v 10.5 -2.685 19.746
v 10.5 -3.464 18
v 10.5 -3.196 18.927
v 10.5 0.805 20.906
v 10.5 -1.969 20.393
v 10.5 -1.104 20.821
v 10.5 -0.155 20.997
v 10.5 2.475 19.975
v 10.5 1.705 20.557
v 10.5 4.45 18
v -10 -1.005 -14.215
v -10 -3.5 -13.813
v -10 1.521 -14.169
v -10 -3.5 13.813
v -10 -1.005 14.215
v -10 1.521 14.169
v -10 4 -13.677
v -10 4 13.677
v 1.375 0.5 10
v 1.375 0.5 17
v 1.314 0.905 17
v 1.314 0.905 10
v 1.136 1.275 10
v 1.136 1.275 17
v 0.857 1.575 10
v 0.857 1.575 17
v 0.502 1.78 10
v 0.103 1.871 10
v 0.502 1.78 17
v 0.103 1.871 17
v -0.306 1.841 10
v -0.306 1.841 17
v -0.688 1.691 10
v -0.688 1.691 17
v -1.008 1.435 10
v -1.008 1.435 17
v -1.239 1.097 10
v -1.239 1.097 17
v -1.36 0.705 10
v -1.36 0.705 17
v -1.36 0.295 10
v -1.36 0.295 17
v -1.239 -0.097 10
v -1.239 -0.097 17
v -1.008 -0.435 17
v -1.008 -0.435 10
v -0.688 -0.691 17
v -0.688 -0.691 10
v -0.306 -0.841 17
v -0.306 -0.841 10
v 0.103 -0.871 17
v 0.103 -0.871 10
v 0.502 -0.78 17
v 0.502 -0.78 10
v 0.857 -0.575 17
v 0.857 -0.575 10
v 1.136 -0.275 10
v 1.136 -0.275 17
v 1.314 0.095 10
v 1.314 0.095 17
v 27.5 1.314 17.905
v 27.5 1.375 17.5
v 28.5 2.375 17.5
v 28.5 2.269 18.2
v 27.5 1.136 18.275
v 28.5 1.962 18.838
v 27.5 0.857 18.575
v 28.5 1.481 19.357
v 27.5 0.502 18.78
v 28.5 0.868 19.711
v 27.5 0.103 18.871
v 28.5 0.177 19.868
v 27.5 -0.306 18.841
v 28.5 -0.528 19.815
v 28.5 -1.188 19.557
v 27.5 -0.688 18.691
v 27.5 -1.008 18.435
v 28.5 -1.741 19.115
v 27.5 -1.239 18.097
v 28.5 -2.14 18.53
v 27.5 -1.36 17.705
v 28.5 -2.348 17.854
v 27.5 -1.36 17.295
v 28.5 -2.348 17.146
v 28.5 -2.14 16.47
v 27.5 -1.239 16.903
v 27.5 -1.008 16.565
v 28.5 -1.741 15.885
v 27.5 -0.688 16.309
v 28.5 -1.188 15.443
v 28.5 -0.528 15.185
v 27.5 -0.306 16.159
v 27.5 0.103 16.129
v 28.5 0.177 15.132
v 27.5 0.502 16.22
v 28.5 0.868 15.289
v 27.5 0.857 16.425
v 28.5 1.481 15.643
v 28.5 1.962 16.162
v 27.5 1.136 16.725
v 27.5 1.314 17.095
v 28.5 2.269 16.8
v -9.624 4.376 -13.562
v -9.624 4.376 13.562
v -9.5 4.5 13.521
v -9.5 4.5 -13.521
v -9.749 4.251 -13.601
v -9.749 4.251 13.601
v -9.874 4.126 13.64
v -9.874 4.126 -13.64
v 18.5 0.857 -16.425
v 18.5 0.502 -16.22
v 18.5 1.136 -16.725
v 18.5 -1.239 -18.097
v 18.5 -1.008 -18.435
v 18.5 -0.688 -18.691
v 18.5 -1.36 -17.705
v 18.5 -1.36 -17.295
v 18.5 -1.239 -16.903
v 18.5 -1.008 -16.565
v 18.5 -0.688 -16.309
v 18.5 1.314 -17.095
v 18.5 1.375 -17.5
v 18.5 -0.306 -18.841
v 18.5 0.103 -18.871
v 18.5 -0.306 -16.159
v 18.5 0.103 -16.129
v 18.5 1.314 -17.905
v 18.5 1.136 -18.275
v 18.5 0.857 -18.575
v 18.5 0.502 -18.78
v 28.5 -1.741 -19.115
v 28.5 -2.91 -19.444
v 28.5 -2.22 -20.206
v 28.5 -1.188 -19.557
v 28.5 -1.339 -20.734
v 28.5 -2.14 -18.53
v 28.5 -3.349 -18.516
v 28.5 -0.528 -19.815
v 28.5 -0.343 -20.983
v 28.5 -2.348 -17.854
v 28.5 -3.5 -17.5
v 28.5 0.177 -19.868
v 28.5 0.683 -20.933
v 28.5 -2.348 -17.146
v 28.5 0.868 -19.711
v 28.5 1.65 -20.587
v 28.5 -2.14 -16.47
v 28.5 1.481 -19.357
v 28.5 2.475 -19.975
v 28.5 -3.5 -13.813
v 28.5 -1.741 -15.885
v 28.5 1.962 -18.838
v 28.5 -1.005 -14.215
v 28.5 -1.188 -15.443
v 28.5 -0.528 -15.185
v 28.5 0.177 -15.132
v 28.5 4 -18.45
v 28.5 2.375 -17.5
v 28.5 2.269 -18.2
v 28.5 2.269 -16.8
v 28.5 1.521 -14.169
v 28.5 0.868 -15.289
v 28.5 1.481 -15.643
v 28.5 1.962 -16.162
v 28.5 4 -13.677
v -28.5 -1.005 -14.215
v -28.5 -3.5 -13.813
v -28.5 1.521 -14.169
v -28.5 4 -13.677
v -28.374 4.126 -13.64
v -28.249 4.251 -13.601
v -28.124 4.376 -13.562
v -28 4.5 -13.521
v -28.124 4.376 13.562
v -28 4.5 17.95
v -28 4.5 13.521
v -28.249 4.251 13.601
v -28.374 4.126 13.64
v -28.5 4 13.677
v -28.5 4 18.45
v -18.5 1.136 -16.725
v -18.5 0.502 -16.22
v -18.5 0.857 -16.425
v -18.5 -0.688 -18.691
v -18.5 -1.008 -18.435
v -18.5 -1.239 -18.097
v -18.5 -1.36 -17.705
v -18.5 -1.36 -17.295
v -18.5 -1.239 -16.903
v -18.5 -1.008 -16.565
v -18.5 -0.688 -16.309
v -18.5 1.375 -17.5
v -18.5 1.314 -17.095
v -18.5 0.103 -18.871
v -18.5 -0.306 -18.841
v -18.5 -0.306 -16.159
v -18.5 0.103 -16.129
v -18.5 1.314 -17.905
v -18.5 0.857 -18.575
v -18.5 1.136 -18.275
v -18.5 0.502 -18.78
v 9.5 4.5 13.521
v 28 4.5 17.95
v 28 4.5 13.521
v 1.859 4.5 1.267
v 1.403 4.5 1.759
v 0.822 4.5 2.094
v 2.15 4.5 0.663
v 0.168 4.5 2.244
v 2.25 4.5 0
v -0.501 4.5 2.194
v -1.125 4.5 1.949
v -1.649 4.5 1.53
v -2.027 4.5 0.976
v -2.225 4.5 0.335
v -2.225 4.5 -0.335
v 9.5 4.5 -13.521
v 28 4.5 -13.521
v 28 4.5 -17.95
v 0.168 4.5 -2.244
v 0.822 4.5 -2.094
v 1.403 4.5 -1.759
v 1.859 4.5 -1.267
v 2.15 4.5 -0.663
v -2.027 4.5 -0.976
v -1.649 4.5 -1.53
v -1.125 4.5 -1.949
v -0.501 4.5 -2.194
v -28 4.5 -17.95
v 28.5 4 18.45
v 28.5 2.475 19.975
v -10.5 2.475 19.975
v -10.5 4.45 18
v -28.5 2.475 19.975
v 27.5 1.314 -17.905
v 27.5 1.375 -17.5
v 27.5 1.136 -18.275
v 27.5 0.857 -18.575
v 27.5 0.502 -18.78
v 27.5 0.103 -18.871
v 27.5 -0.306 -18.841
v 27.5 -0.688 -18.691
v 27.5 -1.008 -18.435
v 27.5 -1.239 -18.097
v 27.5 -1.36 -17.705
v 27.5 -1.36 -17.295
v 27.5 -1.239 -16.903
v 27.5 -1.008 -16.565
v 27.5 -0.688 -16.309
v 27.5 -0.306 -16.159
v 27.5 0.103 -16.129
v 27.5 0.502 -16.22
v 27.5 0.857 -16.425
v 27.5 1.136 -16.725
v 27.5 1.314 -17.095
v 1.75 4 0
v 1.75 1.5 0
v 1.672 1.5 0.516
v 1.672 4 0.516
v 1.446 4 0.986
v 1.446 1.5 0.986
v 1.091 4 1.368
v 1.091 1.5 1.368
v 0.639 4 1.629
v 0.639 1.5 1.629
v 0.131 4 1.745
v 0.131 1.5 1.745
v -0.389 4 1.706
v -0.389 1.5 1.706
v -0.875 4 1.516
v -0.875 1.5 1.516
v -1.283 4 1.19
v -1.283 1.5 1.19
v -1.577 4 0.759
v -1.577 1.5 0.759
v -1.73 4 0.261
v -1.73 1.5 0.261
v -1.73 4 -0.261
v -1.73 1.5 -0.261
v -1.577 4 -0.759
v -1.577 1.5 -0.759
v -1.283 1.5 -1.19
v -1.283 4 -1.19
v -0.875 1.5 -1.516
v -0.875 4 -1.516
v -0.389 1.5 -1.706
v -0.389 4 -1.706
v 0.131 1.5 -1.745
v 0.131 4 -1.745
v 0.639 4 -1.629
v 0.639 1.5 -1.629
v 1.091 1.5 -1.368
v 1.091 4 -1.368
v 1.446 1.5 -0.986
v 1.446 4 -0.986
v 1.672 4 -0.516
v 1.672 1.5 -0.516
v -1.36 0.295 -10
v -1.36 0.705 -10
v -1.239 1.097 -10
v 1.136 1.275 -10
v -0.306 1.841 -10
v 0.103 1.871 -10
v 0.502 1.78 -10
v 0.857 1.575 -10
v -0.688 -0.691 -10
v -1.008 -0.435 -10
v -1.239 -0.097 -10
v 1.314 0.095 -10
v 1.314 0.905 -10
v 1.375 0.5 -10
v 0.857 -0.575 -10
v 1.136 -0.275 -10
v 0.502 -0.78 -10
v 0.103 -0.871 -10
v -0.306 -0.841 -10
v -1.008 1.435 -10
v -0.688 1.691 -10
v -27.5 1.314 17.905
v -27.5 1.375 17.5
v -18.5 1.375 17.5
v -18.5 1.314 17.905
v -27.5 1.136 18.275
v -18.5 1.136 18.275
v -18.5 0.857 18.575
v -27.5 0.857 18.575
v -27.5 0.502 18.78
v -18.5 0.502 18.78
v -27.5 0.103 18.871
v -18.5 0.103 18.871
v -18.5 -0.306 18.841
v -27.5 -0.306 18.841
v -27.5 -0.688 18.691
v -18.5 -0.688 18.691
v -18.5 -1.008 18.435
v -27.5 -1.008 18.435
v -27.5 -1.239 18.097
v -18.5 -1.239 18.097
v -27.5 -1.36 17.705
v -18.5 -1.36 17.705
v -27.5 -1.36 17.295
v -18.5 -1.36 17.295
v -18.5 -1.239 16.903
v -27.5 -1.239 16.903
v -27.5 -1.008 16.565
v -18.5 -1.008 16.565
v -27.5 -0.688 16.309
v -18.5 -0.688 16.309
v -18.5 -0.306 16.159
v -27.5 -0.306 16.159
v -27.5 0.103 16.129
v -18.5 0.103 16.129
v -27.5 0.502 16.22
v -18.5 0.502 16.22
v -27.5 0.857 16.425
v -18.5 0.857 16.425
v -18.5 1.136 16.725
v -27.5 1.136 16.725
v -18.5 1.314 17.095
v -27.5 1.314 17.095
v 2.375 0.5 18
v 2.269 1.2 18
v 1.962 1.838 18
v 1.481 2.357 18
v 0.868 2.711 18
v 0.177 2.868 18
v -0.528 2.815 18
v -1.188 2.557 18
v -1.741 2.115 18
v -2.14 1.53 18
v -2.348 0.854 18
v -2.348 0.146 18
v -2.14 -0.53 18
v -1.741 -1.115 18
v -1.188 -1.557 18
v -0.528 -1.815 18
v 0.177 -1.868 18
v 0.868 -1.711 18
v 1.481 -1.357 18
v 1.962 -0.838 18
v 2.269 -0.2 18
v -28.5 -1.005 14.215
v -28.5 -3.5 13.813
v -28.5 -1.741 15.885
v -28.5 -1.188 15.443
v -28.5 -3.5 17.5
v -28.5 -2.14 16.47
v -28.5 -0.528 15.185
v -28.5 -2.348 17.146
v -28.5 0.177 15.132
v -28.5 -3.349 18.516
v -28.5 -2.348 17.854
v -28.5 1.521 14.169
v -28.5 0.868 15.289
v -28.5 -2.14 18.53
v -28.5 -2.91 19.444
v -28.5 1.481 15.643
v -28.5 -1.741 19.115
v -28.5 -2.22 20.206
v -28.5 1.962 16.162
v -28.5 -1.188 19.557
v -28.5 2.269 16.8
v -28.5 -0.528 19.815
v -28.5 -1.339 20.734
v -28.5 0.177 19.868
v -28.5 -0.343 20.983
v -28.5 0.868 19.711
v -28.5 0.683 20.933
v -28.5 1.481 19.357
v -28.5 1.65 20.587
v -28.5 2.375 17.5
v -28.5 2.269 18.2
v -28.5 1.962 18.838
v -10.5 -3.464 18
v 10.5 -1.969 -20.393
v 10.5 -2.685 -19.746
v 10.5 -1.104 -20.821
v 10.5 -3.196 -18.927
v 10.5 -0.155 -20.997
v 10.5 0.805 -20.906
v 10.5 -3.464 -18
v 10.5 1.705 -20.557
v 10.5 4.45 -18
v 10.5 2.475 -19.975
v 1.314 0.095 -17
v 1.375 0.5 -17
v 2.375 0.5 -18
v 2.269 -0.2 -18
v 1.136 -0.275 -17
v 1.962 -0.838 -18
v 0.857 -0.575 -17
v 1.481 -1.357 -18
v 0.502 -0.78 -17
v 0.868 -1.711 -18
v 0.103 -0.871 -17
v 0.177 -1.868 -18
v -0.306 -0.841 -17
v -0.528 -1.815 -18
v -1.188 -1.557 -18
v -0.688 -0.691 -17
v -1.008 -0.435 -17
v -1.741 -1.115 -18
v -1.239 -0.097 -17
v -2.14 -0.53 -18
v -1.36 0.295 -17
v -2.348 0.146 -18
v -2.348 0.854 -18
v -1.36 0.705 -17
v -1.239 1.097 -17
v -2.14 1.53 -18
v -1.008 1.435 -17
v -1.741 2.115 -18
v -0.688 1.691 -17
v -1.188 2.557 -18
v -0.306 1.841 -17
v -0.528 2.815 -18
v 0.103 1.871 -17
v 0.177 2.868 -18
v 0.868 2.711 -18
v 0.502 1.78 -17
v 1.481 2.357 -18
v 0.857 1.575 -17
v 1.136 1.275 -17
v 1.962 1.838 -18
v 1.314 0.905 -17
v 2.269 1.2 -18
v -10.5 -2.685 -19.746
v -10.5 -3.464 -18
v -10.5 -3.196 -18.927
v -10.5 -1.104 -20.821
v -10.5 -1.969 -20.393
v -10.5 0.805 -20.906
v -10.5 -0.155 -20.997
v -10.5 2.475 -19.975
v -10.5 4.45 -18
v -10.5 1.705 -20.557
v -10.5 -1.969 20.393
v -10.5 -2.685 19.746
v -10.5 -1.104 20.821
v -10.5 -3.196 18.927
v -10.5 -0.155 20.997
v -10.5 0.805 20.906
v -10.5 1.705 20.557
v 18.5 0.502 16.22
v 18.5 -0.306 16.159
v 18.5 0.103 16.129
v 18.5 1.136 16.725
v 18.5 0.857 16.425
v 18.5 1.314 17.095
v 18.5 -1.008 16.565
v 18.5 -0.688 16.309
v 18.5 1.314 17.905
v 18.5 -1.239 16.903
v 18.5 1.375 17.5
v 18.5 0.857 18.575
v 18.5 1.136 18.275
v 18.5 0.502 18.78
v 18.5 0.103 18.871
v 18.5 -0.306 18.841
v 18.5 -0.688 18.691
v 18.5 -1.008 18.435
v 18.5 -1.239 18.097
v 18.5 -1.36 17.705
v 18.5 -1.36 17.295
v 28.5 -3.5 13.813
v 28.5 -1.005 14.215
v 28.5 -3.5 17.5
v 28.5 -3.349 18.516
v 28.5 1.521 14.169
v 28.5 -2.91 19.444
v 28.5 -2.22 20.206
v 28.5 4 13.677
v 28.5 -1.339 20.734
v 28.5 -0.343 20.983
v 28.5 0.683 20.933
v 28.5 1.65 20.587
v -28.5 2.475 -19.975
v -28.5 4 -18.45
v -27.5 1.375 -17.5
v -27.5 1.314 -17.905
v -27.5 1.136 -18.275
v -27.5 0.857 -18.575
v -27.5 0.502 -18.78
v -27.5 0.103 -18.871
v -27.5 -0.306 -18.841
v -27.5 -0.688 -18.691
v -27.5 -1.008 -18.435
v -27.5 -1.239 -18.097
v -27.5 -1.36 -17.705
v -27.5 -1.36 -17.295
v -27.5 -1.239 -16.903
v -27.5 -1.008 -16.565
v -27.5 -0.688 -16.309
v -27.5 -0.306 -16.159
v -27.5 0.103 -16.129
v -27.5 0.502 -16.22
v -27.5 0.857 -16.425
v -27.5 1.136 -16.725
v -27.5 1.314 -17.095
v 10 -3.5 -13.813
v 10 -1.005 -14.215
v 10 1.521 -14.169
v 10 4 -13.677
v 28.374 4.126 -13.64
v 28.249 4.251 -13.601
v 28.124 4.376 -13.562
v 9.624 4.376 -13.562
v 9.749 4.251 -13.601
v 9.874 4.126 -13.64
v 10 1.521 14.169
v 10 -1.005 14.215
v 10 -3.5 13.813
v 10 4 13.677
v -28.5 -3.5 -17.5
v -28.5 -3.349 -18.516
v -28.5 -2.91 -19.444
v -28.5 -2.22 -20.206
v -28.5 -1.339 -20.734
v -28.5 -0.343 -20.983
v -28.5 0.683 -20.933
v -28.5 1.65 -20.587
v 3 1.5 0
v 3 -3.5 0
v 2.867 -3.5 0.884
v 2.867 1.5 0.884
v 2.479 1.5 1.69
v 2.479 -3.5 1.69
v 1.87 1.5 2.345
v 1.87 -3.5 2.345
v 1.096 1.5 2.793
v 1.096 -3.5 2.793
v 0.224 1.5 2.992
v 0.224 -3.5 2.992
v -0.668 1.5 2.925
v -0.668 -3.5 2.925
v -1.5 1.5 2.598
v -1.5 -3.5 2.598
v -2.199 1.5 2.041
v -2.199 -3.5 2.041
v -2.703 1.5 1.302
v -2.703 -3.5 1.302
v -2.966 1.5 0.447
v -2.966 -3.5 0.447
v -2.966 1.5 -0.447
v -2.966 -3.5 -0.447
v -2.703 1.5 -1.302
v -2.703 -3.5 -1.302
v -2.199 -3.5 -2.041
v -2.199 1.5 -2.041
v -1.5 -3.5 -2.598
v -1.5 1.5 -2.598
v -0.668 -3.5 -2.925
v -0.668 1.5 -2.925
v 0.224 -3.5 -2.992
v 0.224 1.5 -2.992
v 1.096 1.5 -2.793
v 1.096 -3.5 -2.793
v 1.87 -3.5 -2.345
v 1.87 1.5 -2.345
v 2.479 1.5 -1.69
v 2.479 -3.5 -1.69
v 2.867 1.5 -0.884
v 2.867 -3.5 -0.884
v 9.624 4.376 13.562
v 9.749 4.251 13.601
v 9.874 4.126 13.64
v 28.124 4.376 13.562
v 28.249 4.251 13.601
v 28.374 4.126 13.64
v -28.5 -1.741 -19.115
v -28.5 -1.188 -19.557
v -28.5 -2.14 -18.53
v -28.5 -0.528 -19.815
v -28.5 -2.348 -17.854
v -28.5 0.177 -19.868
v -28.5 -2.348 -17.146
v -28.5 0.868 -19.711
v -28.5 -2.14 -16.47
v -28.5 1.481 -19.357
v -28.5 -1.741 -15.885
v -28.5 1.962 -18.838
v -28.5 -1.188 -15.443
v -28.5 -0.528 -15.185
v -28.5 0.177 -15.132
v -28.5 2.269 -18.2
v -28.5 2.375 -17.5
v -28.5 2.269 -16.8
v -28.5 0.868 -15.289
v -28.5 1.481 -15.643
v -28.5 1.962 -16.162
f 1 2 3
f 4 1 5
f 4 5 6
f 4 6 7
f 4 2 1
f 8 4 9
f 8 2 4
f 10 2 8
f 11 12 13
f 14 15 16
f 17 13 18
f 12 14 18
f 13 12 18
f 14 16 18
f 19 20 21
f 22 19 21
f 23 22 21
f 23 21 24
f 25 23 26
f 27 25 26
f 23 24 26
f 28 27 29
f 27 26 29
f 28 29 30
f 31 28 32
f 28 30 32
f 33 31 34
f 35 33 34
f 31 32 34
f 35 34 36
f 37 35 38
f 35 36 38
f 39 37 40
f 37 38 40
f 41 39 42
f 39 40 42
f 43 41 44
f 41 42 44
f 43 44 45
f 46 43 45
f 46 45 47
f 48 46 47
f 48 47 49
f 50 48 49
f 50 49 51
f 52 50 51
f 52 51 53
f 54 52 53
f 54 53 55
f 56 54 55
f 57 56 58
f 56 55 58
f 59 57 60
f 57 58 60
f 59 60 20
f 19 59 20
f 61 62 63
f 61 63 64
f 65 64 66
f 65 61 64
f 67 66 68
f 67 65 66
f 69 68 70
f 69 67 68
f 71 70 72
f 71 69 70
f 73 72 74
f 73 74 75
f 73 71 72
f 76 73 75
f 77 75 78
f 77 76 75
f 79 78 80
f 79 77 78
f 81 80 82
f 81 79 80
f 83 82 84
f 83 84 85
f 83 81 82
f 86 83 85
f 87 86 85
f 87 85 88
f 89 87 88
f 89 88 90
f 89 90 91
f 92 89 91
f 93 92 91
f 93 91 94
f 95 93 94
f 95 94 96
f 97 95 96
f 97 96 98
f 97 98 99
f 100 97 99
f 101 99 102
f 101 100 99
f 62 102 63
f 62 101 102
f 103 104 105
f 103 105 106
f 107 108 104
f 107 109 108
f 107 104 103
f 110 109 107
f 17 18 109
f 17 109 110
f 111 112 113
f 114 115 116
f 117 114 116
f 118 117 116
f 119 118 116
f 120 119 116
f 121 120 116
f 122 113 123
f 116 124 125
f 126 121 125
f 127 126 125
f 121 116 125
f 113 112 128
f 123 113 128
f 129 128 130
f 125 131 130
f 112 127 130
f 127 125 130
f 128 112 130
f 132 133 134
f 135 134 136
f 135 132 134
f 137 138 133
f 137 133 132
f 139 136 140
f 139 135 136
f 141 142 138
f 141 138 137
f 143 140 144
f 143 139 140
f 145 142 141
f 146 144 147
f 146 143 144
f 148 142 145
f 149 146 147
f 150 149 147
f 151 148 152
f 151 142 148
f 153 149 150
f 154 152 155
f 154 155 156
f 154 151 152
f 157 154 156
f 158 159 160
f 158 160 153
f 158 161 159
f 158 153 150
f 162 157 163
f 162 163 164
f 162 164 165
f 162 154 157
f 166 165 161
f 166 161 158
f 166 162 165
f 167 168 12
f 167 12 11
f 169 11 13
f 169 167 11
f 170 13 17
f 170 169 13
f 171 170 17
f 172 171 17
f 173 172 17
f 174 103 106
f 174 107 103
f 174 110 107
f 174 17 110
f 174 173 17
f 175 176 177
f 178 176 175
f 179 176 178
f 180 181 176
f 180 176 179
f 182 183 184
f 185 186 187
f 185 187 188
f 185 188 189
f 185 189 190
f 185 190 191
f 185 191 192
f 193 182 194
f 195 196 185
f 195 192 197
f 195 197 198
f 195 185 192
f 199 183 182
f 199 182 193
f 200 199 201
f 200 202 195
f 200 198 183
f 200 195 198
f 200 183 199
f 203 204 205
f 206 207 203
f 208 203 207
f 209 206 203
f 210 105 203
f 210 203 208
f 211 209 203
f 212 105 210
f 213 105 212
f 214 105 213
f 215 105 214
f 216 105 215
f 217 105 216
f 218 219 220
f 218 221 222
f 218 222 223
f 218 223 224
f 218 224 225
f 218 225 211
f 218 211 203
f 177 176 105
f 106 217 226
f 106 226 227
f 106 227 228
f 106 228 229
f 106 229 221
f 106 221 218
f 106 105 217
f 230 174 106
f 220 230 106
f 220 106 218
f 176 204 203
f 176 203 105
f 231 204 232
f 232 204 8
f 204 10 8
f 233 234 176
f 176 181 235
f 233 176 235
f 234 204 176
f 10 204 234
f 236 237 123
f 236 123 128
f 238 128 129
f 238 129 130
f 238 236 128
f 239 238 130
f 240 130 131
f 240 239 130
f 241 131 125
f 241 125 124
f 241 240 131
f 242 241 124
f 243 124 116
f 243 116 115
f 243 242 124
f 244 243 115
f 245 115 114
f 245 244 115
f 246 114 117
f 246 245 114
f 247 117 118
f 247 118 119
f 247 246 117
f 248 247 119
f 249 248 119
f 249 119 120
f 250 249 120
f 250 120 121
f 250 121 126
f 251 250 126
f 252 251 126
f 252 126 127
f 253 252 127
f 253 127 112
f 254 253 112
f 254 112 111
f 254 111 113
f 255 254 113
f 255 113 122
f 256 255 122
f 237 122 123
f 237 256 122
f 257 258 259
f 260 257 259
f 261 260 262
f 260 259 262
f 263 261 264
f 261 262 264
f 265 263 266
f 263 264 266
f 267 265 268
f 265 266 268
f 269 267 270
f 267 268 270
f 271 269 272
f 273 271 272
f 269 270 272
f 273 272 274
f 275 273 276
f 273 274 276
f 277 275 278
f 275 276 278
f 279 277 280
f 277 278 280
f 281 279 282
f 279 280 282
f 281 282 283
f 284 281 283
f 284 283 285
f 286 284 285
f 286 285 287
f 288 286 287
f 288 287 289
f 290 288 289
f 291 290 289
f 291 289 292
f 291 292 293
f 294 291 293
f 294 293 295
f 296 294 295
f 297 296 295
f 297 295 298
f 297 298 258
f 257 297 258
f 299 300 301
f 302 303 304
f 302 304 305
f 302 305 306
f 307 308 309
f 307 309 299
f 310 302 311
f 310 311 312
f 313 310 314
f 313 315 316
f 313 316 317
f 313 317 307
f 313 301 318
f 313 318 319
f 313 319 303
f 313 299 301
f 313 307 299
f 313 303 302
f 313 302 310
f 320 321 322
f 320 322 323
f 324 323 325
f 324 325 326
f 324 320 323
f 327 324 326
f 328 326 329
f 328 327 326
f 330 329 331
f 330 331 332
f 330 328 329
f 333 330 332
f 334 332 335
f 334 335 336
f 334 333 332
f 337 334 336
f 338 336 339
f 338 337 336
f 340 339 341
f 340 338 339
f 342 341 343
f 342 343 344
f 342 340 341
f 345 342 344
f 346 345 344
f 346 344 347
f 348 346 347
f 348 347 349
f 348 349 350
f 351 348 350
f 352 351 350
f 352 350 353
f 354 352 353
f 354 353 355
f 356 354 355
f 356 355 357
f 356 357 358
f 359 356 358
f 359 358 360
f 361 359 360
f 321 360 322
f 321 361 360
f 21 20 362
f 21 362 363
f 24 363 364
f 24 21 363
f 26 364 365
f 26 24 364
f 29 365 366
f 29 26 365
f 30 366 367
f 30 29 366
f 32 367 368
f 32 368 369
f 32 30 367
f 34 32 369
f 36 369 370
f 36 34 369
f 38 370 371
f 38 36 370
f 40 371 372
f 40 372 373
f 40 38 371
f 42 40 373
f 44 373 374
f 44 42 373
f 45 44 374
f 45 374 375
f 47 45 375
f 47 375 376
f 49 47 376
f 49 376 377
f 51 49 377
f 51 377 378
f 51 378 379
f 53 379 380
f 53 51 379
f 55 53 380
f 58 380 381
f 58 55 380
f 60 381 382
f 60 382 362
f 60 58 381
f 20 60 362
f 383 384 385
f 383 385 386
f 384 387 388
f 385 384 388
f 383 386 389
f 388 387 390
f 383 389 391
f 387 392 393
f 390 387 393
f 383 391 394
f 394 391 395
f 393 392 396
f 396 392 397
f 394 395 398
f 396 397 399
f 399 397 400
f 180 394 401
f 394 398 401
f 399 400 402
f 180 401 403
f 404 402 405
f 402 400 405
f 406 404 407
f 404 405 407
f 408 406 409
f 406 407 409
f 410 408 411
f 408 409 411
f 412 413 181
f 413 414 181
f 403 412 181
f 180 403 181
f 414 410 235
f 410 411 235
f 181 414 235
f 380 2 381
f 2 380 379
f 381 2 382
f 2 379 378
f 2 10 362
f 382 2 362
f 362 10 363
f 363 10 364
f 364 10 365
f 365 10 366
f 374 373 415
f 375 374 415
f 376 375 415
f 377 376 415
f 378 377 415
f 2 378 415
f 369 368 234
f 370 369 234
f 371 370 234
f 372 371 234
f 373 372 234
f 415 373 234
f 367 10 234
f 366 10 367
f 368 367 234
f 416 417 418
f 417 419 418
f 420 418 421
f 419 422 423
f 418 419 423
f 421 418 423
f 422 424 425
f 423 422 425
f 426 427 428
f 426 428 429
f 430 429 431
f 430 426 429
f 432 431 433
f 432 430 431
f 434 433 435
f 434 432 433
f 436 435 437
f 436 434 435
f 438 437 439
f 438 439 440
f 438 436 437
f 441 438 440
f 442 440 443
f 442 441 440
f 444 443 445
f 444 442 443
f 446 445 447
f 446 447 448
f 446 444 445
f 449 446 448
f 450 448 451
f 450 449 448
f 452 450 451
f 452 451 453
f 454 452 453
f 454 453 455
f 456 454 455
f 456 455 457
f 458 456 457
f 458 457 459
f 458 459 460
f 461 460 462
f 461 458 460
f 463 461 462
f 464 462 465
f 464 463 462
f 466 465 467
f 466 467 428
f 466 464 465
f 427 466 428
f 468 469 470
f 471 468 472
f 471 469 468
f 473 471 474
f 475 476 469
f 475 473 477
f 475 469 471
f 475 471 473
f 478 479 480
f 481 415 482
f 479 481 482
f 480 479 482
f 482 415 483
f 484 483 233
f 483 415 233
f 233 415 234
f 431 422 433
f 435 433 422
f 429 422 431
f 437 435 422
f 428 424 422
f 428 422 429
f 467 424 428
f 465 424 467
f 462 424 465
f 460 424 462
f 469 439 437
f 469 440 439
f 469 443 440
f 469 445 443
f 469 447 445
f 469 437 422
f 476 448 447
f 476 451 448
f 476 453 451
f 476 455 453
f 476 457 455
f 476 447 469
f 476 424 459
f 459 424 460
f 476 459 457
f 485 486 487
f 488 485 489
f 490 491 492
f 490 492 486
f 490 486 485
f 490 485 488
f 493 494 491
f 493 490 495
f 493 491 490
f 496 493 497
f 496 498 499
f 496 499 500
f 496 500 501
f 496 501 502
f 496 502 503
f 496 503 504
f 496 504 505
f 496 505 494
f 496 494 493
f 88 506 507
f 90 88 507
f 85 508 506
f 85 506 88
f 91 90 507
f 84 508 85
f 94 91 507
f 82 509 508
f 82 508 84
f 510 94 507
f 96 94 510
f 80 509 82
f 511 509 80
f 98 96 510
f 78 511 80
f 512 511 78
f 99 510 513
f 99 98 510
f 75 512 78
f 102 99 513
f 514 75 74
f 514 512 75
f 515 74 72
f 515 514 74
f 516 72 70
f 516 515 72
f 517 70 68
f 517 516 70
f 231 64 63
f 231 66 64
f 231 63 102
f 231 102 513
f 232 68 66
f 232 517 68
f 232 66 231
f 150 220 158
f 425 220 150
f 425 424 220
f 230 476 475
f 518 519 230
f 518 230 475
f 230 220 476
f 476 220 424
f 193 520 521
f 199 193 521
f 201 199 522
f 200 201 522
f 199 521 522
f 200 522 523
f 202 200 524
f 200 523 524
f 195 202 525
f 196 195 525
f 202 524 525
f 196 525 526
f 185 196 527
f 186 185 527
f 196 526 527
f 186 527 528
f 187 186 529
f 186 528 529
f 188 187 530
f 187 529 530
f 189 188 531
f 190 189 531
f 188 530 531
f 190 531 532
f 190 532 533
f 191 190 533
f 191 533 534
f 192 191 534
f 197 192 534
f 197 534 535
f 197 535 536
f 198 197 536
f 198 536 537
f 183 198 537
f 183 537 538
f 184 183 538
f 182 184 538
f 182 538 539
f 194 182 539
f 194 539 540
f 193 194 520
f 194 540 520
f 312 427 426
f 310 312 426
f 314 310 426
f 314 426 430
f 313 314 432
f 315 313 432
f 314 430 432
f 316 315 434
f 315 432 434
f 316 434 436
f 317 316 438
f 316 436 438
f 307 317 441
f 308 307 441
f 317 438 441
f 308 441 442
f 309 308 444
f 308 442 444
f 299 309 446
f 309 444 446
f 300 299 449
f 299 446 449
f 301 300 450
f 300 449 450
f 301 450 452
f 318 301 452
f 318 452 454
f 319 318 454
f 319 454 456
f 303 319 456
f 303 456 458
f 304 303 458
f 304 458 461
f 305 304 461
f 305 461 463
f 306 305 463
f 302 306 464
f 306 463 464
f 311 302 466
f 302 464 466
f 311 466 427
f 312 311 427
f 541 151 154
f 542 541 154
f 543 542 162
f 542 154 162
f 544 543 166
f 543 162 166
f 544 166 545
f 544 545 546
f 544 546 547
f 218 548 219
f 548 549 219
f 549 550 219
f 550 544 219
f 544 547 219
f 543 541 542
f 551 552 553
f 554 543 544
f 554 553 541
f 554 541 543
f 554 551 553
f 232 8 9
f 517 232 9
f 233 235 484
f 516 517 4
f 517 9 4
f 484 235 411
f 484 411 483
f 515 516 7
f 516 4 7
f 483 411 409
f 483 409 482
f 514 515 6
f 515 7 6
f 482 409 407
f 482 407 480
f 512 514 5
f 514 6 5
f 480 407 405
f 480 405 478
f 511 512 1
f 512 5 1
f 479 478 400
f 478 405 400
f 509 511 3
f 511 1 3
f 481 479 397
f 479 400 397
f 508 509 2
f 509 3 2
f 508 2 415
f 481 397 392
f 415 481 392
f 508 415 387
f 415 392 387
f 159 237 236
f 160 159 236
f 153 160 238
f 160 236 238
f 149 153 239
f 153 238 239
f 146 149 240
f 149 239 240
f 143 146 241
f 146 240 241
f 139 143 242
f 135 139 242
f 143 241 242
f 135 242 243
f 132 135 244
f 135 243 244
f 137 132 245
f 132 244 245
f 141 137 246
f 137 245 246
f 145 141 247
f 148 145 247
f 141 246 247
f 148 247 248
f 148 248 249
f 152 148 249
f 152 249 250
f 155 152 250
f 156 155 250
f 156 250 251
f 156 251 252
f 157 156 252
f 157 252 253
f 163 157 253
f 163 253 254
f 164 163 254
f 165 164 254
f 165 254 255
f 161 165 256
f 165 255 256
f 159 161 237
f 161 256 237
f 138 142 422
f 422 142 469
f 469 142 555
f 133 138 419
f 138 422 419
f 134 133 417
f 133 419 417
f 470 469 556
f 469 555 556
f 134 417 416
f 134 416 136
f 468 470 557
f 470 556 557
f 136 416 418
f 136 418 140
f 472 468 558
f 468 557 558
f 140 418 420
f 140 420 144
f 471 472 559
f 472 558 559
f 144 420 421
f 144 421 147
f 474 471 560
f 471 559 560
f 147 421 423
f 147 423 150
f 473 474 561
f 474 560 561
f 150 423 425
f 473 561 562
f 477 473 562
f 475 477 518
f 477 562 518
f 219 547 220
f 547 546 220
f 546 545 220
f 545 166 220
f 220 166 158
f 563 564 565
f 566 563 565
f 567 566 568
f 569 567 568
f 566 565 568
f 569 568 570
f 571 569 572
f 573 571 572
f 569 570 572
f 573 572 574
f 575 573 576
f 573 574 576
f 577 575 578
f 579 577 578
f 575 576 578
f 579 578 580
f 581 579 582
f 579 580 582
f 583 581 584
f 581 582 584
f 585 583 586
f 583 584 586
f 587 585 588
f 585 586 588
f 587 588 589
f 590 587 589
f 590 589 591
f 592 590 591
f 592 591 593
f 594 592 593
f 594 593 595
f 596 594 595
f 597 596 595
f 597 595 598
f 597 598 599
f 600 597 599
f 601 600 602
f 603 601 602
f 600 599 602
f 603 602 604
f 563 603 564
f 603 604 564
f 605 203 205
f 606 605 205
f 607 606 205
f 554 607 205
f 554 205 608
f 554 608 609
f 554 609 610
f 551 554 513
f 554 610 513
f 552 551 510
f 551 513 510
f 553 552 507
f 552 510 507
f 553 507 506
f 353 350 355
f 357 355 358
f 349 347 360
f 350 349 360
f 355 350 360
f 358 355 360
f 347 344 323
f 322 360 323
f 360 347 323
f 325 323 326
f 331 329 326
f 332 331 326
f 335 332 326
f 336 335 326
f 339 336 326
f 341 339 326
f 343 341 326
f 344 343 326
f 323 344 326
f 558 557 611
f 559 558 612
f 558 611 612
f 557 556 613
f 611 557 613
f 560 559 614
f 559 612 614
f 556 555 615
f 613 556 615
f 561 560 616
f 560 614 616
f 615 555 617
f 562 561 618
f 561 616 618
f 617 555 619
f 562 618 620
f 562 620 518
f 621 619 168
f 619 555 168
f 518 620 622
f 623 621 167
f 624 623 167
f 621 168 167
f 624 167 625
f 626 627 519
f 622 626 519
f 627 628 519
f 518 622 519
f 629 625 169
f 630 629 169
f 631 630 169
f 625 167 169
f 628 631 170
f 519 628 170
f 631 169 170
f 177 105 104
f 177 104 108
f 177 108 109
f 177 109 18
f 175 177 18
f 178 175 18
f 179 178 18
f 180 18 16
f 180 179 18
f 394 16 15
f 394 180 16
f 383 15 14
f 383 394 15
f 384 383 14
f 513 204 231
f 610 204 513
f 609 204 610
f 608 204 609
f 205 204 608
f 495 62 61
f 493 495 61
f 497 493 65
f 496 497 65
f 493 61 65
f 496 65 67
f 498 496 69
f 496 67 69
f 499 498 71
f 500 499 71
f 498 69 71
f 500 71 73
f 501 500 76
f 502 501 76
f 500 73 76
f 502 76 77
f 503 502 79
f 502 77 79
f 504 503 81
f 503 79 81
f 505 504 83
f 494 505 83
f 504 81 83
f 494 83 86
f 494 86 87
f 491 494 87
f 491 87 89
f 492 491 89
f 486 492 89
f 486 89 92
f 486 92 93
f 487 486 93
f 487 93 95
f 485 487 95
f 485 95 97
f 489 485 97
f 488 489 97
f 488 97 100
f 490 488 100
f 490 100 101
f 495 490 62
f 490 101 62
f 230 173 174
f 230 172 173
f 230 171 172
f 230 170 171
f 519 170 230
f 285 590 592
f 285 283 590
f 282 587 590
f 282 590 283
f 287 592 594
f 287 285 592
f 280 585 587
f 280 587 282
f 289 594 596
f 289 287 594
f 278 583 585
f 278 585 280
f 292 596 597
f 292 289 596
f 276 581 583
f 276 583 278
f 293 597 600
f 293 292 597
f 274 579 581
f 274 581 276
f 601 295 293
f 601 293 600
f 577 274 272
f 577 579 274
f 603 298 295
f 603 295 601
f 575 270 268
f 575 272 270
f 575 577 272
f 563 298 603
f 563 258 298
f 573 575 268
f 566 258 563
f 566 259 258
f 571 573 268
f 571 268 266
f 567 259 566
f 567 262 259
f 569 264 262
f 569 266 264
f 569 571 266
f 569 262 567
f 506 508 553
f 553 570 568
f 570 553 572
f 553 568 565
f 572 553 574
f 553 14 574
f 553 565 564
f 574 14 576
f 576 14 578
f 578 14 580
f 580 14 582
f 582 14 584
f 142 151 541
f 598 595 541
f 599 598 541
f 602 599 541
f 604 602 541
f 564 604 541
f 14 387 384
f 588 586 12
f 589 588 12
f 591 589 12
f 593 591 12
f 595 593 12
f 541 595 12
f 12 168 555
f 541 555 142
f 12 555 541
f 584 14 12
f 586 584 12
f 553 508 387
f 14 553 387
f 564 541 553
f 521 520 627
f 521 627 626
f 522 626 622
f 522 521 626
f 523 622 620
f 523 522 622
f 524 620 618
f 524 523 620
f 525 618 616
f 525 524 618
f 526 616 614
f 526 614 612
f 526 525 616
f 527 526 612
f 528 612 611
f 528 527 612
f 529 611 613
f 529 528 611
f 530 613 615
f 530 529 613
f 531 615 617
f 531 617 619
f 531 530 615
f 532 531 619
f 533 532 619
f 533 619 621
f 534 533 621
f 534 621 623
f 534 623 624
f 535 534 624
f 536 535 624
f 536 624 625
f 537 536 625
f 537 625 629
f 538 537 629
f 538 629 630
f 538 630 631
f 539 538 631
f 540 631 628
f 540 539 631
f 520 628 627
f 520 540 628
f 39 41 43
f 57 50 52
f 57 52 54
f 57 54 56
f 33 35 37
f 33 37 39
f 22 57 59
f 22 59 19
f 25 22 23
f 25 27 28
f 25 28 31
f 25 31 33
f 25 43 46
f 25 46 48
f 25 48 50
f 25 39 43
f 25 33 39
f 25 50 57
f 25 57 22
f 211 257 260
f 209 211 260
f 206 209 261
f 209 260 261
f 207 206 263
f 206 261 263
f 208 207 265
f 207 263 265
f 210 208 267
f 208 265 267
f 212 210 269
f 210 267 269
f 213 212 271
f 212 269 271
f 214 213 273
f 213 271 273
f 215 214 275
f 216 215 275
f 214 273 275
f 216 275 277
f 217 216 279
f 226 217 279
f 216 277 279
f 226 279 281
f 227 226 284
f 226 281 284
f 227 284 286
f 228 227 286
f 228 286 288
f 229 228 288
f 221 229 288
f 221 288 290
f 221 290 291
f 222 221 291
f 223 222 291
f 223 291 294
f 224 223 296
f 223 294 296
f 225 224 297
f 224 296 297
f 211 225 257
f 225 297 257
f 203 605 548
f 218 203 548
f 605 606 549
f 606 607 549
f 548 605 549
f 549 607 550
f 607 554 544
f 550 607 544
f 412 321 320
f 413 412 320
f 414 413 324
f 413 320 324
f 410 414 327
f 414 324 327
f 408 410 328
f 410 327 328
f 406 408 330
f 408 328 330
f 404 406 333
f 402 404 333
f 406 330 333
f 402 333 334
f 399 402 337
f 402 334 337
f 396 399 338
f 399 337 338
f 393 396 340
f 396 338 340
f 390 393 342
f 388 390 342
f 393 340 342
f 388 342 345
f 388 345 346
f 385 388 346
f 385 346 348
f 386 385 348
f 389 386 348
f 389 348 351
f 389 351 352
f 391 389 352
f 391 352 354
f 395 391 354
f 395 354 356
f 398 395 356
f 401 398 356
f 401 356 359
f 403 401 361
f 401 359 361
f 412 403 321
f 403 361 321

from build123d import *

# Parameters (mm, degrees)
PAD001_DEPTH    = 28.5
SKETCH002_R     = 14.25
POCKET_DEPTH    = 18.5
SKETCH003_R     = 1.375
POCKET001_DEPTH = 10
CHAMFER_SIZE    = 1
SKETCH004_W     = 10.5
SKETCH004_H     = 4
POCKET002_DEPTH = 10
SKETCH008_R     = 3
POCKET004_DEPTH = 5
SKETCH009_R     = 1.75
POCKET005_DEPTH = 5
CHAMFER004_SIZE = 0.5
SKETCH012_R     = 1.375
POCKET008_DEPTH = 8
SKETCH013_R     = 1.375
POCKET009_DEPTH = 8
CHAMFER005_SIZE = 1


with BuildPart() as motorbracketgroovemirrored001:
    # Sketch001 → Pad001 (new body)
    with BuildSketch(Plane.YZ):
        with BuildLine():
            ThreePointArc((2.474858, 19.974889), (-1.339402, 20.733574), (-3.5, 17.5))
            Line((-3.5, 17.5), (-3.5, -17.5))
            ThreePointArc((-3.5, -17.5), (-1.339402, -20.733574), (2.474858, -19.974889))
            Line((4.5, -17.949747), (2.474858, -19.974889))
            Line((4.5, 17.949747), (4.5, -17.949747))
            Line((4.5, 17.949747), (2.474858, 19.974889))
        make_face()
    extrude(amount=PAD001_DEPTH)

    # Sketch002 → Pocket (cut)
    with BuildSketch(Plane.YZ.offset(28.5)):
        Circle(SKETCH002_R)
    extrude(amount=-POCKET_DEPTH, mode=Mode.SUBTRACT)

    # Sketch003 → Pocket001 (cut)
    with BuildSketch(Plane.YZ.offset(28.5)):
        with Locations((0, 17.5)):
            Circle(SKETCH003_R)
    pocket001 = extrude(amount=-POCKET001_DEPTH, mode=Mode.SUBTRACT)

    # Mirrored: Pocket001 across Sketch003 H_Axis
    add(pocket001.mirror(Plane(origin=(28.5, 0, 0), x_dir=(1, 0, 0), z_dir=(0, 0, 1))), mode=Mode.SUBTRACT)

    # Chamfer
    chamfer_edges = [motorbracketgroovemirrored001.edges().sort_by_distance(p)[0] for p in [
        (28.5, -1.375, 17.5),
        (28.5, -1.375, -17.5),
    ]]
    chamfer(chamfer_edges, length=CHAMFER_SIZE)

    # Sketch004 → Pocket002 (cut)
    with BuildSketch(Plane(origin=(0, 4.5, 0), x_dir=(-1, 0, 0), z_dir=(0, 1, 0))):
        with Locations((-5.25, 20)):
            Rectangle(SKETCH004_W, SKETCH004_H)
    pocket002 = extrude(amount=-POCKET002_DEPTH, mode=Mode.SUBTRACT)

    # Mirrored001: Pocket002 across Sketch004 H_Axis
    add(pocket002.mirror(Plane(origin=(0, 4.5, 0), x_dir=(0, 1, 0), z_dir=(0, 0, 1))), mode=Mode.SUBTRACT)


with BuildPart() as motorbracketscrewchamfer005_final:
    # Part__Mirroring: instance of MotorBracketGrooveMirrored001
    add(motorbracketgroovemirrored001.part.mirror(Plane(origin=(0, 0, 0), x_dir=(0, -1, 0), z_dir=(1, 0, 0))))

    # Fusion001: union MotorBracketGrooveMirrored001
    add(motorbracketgroovemirrored001.part)

    # Sketch008 → Pocket004 (cut)
    with BuildSketch(Plane.XZ.offset(3.5)):
        Circle(SKETCH008_R)
    extrude(amount=-POCKET004_DEPTH, mode=Mode.SUBTRACT)

    # Sketch009 → Pocket005 (cut)
    with BuildSketch(Plane.XZ.offset(-1.5)):
        Circle(SKETCH009_R)
    extrude(amount=-POCKET005_DEPTH, mode=Mode.SUBTRACT)

    # Chamfer004
    chamfer004_edges = [motorbracketscrewchamfer005_final.edges().sort_by_distance(p)[0] for p in [
        (10, 4.5, 0),
        (0, 4.5, 1.75),
        (-10, 4.5, 0),
        (-28.5, 4.5, -15.735282),
        (-28.5, 4.5, 15.735282),
        (28.5, 4.5, -15.735282),
        (28.5, 4.5, 15.735282),
    ]]
    chamfer(chamfer004_edges, length=CHAMFER004_SIZE)

    # Sketch012 → Pocket008 (cut)
    with BuildSketch(Plane.XY.offset(18)):
        with Locations((0, 0.5)):
            Circle(SKETCH012_R)
    extrude(amount=-POCKET008_DEPTH, mode=Mode.SUBTRACT)

    # Sketch013 → Pocket009 (cut)
    with BuildSketch(Plane(origin=(0, 0, -18), x_dir=(1, 0, 0), z_dir=(0, 0, -1))):
        with Locations((0, -0.5)):
            Circle(SKETCH013_R)
    extrude(amount=-POCKET009_DEPTH, mode=Mode.SUBTRACT)

    # Chamfer005
    chamfer005_edges = [motorbracketscrewchamfer005_final.edges().sort_by_distance(p)[0] for p in [
        (-1.375, 0.5, -18),
        (-1.375, 0.5, 18),
    ]]
    chamfer(chamfer005_edges, length=CHAMFER005_SIZE)


solid = motorbracketscrewchamfer005_final.part
